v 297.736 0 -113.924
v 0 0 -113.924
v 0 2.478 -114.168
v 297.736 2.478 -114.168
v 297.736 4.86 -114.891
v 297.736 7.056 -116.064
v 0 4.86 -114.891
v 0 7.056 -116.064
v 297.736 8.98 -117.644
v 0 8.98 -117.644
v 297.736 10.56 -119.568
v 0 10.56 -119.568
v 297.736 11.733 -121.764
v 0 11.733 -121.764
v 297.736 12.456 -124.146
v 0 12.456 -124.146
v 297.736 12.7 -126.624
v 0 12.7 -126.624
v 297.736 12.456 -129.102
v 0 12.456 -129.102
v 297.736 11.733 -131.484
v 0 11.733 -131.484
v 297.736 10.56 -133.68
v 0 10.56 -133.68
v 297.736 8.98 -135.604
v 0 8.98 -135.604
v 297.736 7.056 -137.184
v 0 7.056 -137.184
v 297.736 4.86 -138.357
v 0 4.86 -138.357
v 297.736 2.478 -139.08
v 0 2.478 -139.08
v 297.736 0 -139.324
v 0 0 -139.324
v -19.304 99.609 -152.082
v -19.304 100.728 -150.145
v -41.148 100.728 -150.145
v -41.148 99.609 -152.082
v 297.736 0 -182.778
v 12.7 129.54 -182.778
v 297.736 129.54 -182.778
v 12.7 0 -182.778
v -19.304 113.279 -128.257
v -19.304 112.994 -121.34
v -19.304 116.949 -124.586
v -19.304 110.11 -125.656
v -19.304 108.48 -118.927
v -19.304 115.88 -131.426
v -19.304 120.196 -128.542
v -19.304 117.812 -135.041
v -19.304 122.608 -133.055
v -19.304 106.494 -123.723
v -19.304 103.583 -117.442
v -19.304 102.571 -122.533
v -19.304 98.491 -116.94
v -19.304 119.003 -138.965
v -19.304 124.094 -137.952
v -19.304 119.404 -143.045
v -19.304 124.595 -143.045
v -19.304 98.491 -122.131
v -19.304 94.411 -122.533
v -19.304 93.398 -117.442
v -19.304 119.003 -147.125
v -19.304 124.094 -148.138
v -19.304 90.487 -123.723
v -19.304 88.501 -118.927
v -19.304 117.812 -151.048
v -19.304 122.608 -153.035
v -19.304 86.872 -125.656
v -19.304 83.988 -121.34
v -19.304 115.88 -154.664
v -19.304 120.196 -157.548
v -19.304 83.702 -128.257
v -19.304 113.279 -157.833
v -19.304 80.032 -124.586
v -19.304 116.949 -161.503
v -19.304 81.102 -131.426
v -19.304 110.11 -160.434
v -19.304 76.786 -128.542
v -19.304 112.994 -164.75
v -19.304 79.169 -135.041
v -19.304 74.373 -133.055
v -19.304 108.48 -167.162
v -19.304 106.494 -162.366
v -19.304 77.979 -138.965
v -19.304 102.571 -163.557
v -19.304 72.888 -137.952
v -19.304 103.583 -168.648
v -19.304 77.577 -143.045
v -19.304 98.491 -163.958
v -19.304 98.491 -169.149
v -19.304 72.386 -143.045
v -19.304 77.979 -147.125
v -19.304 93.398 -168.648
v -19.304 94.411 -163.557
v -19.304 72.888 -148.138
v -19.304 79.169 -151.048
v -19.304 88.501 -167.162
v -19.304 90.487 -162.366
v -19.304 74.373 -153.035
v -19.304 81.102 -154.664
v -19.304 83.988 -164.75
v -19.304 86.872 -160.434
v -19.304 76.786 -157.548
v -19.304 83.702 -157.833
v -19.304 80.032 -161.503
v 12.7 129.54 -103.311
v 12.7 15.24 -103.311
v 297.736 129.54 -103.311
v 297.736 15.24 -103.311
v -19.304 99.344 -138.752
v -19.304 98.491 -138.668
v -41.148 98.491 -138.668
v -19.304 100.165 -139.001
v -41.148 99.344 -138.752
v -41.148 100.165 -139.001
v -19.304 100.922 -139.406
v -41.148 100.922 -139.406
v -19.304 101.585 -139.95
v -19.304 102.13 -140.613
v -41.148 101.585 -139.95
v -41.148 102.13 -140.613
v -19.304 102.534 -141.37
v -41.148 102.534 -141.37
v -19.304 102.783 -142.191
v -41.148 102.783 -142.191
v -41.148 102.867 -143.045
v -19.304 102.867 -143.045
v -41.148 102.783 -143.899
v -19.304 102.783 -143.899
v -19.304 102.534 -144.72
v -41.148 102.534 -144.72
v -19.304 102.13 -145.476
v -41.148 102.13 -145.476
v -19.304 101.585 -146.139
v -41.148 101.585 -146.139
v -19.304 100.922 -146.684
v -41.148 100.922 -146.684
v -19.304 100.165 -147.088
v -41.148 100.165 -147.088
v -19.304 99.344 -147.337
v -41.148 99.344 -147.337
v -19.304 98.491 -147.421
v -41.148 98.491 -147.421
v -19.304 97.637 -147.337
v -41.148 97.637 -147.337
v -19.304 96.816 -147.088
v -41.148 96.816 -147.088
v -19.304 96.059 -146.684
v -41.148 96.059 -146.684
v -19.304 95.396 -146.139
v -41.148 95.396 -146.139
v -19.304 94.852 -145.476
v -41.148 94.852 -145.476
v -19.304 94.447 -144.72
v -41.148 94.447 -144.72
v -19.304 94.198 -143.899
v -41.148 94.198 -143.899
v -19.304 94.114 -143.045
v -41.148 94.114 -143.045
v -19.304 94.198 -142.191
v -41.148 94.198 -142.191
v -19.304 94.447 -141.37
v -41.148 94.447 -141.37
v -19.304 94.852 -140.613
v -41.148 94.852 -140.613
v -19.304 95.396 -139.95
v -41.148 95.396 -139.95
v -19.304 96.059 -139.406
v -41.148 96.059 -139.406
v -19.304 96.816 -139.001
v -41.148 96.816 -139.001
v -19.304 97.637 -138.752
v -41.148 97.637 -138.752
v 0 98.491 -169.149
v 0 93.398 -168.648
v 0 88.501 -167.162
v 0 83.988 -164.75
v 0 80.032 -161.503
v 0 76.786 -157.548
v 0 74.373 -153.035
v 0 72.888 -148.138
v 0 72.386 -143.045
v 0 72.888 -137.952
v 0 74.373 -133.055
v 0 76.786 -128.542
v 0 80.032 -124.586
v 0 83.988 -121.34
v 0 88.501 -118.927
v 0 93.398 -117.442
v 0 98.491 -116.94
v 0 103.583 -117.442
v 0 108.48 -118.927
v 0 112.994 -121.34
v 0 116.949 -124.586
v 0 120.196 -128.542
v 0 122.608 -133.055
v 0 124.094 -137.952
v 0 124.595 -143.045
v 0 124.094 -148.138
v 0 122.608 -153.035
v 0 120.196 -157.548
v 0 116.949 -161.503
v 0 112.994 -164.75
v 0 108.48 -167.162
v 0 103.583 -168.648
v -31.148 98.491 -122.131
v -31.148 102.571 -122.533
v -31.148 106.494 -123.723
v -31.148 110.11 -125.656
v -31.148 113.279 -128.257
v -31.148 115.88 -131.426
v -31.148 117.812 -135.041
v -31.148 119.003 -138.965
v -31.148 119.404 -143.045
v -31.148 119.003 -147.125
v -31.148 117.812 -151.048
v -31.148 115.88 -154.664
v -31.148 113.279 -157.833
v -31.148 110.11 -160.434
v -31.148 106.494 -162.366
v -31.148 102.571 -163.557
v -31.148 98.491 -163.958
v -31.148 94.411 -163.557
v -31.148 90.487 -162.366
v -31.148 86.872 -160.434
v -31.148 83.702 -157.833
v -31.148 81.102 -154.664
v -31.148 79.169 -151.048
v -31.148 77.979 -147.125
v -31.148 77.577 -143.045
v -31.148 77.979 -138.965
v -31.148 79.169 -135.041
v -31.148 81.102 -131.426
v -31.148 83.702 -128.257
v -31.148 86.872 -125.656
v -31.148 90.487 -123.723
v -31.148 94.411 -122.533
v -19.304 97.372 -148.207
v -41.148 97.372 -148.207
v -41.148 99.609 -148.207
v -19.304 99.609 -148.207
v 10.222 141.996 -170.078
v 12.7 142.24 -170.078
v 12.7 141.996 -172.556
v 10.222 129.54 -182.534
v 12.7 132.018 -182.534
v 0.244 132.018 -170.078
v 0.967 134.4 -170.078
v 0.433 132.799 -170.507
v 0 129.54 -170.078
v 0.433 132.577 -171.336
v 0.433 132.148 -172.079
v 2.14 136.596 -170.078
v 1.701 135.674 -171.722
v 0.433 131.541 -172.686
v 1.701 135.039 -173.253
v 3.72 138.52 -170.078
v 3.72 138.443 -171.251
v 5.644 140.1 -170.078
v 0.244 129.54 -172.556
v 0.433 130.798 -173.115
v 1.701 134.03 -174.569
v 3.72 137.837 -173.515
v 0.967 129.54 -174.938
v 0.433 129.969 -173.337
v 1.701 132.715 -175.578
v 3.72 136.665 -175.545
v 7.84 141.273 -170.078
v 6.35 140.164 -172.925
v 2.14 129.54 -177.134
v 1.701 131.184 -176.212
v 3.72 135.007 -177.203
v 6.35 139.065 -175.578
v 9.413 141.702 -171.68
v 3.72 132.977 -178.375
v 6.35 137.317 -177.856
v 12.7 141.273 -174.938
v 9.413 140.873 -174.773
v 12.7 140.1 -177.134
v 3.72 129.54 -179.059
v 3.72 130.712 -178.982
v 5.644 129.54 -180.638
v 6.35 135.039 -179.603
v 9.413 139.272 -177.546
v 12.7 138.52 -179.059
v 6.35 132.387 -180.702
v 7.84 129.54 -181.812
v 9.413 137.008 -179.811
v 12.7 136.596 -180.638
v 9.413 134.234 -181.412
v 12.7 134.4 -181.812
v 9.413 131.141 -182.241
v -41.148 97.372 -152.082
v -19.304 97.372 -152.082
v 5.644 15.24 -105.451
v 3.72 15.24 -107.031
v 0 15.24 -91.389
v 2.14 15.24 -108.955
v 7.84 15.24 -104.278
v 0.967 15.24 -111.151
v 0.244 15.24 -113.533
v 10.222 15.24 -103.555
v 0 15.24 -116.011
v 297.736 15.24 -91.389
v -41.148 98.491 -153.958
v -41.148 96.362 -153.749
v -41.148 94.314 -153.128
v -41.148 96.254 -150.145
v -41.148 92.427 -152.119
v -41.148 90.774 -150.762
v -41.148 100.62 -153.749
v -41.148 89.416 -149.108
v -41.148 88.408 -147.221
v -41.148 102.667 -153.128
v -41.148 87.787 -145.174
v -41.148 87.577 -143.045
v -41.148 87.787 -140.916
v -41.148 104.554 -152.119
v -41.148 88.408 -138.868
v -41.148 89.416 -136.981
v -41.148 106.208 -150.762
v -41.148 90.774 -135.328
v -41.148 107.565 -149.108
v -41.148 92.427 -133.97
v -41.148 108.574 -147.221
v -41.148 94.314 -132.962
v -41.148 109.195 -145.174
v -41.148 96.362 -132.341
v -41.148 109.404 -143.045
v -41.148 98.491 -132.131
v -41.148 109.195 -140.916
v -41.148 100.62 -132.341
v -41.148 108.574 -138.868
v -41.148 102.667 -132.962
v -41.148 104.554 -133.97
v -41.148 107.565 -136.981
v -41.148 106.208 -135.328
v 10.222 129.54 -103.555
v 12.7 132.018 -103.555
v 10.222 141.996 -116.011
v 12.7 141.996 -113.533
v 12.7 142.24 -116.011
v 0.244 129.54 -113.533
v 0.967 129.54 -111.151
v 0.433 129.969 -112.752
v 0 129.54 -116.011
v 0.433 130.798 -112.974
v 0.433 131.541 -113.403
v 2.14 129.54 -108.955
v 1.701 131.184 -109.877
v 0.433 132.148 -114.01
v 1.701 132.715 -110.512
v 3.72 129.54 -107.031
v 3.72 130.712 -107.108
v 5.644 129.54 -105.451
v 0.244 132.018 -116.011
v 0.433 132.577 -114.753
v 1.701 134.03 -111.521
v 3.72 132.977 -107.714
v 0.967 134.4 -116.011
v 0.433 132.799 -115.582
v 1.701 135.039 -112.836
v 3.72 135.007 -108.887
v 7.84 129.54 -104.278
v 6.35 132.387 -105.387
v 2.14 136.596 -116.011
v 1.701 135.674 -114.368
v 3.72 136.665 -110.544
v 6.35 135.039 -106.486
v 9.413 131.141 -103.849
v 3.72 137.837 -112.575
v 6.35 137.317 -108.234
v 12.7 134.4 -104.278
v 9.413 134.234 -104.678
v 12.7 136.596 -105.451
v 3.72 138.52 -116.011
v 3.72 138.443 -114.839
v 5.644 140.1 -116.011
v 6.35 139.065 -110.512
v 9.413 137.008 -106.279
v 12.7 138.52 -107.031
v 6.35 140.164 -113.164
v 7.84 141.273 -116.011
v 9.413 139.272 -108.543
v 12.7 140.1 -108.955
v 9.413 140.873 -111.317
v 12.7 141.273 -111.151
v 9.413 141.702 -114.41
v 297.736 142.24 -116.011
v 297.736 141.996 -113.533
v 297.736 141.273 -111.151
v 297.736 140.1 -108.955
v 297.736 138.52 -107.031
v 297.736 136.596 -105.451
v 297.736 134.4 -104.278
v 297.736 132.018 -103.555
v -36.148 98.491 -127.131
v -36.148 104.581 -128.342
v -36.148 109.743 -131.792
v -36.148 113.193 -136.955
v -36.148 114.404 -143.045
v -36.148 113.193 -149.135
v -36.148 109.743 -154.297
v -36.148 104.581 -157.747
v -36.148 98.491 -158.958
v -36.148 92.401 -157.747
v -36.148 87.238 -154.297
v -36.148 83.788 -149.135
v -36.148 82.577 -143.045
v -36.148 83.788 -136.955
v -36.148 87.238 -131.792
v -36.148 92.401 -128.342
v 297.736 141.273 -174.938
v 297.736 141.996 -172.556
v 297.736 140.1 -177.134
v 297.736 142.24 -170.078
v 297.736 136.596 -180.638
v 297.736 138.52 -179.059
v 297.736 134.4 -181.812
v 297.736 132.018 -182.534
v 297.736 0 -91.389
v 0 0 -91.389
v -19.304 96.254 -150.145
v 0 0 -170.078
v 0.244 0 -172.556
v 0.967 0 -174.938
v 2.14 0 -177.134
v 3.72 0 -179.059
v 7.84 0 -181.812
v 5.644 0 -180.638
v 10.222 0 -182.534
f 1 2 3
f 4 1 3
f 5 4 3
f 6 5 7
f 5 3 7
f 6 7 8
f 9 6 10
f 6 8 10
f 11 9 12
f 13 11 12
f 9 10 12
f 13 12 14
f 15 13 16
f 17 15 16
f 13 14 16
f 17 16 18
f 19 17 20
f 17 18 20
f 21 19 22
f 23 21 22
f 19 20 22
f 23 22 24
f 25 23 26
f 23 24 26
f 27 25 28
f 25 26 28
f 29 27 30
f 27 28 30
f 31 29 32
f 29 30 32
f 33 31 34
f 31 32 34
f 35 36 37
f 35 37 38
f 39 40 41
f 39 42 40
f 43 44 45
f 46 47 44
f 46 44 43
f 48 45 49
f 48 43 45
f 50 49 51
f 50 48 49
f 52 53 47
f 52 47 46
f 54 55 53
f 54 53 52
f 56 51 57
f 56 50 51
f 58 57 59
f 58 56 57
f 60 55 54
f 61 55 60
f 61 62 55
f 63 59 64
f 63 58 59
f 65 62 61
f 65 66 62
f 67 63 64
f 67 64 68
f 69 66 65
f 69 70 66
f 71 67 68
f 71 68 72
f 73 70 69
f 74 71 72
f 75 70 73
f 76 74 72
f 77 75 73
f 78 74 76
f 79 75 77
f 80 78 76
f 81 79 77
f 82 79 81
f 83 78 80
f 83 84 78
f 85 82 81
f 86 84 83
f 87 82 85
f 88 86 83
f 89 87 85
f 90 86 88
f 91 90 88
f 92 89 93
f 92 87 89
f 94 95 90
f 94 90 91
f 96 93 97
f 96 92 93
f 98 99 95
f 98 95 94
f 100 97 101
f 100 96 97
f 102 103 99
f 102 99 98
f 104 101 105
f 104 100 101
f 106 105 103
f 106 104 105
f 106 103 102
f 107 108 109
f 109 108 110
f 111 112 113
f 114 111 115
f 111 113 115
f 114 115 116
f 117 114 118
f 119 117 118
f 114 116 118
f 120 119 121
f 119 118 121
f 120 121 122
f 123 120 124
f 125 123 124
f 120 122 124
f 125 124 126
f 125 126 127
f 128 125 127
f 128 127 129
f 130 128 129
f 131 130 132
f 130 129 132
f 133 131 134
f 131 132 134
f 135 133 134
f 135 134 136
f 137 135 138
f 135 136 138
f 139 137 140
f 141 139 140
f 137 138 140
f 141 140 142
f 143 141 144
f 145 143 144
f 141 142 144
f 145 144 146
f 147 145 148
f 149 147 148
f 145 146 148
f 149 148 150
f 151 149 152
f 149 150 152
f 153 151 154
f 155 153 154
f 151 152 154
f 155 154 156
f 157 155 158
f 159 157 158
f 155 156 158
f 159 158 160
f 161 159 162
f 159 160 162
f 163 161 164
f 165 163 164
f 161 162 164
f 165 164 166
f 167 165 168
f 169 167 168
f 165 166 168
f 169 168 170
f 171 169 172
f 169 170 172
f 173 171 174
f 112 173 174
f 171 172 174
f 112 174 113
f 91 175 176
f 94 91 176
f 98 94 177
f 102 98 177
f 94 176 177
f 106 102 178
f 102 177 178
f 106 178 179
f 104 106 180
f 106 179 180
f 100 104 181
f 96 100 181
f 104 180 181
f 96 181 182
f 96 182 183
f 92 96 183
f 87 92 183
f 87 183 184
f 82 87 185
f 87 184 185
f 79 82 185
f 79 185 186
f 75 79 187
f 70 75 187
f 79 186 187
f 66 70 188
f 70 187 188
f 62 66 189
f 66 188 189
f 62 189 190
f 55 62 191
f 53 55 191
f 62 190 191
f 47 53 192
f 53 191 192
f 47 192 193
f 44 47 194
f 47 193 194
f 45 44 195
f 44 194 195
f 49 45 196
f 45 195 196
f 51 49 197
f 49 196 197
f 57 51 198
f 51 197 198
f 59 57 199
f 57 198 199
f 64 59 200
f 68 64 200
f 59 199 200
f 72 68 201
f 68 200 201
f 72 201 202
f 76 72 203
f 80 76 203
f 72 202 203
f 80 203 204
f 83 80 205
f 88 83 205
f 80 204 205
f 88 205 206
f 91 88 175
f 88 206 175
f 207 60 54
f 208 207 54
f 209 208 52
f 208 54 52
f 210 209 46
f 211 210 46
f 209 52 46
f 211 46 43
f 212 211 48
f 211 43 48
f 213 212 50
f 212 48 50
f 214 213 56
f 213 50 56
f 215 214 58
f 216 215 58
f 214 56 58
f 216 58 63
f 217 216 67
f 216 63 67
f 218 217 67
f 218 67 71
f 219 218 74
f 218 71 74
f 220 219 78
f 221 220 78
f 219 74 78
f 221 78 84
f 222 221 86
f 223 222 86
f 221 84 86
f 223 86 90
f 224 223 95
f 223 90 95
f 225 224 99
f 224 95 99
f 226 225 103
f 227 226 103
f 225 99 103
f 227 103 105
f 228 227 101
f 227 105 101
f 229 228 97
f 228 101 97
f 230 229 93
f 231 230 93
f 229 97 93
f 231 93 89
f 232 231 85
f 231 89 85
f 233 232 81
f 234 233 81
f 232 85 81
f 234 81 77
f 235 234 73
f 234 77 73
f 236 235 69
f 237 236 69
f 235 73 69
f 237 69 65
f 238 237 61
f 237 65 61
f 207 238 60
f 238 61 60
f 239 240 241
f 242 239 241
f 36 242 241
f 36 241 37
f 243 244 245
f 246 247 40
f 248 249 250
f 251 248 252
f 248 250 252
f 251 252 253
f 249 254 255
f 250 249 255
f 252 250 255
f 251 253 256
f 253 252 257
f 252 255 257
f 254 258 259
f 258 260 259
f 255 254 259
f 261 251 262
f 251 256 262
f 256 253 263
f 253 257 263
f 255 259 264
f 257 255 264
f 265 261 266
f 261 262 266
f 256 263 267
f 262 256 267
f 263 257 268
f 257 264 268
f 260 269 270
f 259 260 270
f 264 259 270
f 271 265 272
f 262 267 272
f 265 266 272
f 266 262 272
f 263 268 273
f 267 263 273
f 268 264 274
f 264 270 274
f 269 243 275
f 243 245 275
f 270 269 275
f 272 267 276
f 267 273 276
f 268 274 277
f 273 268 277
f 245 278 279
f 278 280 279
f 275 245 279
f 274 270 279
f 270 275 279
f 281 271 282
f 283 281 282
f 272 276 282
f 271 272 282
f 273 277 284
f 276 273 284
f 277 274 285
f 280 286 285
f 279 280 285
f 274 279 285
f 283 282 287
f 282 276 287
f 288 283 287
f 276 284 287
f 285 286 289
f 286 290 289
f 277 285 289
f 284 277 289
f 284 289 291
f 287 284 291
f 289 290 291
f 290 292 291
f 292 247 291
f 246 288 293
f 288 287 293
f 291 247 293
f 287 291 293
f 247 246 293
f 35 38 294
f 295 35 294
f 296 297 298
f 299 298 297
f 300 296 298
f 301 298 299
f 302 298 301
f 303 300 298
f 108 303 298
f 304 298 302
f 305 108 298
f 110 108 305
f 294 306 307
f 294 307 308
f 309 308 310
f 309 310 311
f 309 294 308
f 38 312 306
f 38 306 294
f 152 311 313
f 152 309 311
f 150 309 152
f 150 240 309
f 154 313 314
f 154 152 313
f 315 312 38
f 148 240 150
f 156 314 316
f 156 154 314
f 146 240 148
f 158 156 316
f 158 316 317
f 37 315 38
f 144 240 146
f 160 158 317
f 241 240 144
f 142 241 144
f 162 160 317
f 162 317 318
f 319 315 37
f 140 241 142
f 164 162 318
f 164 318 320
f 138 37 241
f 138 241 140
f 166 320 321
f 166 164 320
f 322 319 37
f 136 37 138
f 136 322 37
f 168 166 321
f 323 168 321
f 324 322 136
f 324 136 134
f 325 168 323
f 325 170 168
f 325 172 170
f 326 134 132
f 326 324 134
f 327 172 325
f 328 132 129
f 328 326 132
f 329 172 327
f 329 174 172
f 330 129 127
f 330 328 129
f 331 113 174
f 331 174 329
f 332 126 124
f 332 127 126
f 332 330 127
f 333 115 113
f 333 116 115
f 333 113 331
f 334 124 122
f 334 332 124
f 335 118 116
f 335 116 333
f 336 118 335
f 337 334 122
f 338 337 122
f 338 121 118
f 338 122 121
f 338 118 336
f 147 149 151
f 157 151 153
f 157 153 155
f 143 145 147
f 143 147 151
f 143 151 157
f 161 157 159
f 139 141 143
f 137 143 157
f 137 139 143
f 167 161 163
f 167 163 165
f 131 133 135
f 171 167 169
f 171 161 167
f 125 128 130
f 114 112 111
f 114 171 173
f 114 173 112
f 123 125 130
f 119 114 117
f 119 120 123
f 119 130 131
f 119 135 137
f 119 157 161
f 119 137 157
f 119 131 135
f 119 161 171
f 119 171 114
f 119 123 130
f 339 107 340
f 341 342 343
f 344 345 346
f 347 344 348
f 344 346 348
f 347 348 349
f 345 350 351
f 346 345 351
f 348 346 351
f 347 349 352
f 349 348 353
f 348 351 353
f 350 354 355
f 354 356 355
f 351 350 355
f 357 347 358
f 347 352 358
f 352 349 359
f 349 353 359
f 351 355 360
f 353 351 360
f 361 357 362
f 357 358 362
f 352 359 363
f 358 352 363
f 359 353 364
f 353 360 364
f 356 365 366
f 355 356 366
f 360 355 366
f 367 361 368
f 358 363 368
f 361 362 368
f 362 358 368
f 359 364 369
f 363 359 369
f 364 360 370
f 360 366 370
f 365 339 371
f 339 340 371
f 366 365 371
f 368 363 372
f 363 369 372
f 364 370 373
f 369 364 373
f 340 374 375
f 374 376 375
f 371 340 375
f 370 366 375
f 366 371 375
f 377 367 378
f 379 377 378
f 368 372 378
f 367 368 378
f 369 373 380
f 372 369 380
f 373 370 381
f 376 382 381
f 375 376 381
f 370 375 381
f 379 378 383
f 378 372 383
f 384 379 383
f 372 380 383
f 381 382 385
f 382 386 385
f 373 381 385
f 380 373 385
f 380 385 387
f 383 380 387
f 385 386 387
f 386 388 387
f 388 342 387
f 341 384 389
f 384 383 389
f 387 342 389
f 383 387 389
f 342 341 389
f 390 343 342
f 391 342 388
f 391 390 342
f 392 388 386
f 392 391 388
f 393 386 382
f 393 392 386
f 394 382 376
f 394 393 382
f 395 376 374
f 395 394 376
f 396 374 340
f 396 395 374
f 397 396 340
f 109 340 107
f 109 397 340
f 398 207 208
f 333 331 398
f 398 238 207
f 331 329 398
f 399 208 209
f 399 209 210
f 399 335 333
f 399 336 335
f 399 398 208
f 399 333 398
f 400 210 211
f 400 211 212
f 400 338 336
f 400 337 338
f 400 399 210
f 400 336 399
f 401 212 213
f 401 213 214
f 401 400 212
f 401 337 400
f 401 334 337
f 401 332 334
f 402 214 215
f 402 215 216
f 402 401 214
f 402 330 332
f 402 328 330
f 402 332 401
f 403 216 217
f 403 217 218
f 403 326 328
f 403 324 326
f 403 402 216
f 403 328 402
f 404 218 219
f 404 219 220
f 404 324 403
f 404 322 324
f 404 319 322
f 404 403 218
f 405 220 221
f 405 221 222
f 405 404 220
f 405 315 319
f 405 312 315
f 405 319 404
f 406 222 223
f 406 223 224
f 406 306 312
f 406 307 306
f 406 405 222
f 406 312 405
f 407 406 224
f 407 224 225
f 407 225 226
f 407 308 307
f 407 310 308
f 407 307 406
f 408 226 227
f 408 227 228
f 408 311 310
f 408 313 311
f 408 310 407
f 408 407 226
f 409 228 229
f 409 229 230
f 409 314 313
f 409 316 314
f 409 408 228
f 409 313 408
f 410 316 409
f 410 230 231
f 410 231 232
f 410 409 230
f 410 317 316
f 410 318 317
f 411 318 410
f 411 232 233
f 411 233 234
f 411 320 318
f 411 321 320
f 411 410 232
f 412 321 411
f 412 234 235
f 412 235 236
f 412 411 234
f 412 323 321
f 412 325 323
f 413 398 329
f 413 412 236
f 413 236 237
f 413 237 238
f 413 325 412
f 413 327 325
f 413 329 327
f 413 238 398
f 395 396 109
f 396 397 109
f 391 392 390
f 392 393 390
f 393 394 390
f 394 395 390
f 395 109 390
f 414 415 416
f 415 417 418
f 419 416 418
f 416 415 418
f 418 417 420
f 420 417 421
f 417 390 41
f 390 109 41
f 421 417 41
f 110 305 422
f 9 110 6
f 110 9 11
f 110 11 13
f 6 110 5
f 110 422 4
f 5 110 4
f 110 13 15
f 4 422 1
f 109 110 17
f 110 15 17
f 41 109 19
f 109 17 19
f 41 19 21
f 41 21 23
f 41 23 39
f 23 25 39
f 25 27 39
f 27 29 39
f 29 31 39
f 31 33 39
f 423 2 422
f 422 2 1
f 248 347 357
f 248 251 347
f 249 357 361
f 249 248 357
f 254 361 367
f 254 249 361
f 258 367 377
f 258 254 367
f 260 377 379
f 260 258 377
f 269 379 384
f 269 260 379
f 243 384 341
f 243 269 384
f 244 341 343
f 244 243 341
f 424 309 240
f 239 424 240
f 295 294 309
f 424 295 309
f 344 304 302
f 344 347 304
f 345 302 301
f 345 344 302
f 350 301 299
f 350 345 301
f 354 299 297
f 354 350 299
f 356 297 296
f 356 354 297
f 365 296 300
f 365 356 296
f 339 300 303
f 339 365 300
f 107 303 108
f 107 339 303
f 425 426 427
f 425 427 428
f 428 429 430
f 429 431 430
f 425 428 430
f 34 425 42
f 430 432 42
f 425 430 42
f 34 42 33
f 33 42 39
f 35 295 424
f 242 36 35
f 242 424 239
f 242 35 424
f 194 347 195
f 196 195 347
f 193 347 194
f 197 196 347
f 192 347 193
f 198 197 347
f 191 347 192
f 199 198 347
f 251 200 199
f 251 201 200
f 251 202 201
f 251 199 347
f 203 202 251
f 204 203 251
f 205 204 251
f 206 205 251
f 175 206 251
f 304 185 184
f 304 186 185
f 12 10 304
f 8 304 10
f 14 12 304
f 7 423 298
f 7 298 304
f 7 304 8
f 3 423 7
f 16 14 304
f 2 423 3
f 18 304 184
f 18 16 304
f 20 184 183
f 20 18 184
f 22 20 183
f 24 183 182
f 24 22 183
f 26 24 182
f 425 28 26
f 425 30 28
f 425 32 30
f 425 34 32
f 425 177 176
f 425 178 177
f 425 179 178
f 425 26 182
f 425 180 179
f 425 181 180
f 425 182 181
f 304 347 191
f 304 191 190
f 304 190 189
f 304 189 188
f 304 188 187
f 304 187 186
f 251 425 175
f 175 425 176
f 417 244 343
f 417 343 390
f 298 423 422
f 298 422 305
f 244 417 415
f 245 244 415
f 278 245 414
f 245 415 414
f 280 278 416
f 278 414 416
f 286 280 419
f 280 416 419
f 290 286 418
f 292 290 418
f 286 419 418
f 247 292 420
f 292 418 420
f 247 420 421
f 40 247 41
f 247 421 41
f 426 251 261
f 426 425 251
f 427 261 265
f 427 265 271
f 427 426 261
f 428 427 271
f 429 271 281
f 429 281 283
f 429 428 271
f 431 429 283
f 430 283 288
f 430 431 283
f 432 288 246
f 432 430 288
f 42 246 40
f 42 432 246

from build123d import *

# Parameters (mm, degrees)
SKETCH1_W           = 297.73626
SKETCH1_H           = 182.7784
BOSS_EXTRUDE1_DEPTH = 15.24
CUT_EXTRUDE1_DEPTH  = 350.695698609
SKETCH4_W           = 91.3892
SKETCH4_H           = 15.24
CUT_EXTRUDE3_DEPTH  = 350.695698609
SKETCH5_W           = 297.73626
SKETCH5_H           = 79.467279424
BOSS_EXTRUDE2_DEPTH = 127
FILLET1_R           = 12.7
FILLET2_R           = 12.7
FILLET3_R           = 12.7
SKETCH6_R           = 26.104541014
BOSS_EXTRUDE3_DEPTH = 19.304
SKETCH7_R           = 20.913687516
BOSS_EXTRUDE4_DEPTH = 21.844
CHAMFER1_SIZE       = 10
SKETCH8_R           = 4.376446561
CUT_EXTRUDE4_DEPTH  = 21.844


with BuildPart() as part:
    # Sketch1 → Boss-Extrude1 (new body)
    with BuildSketch(Plane(origin=(0, 0, 0), x_dir=(1, 0, 0), z_dir=(0, 1, 0))):
        with Locations((148.86813, 91.3892)):
            Rectangle(SKETCH1_W, SKETCH1_H)
    extrude(amount=BOSS_EXTRUDE1_DEPTH)

    # Sketch2 → Cut-Extrude1 (cut, through all)
    with BuildSketch(Plane.ZY):
        with BuildLine():
            ThreePointArc((-43.45432, 0), (-56.15432, 12.7), (-68.85432, 0))
            Line((-68.85432, 0), (-43.45432, 0))
        make_face()
        with BuildLine():
            ThreePointArc((-113.92408, 0), (-126.62408, 12.7), (-139.32408, 0))
            Line((-139.32408, 0), (-126.62408, 0))
            Line((-126.62408, 0), (-113.92408, 0))
        make_face()
    extrude(amount=-CUT_EXTRUDE1_DEPTH, mode=Mode.SUBTRACT)

    # Sketch4 → Cut-Extrude3 (cut, through all)
    with BuildSketch(Plane.ZY):
        with Locations((-45.6946, 7.62)):
            Rectangle(SKETCH4_W, SKETCH4_H)
    extrude(amount=-CUT_EXTRUDE3_DEPTH, mode=Mode.SUBTRACT)

    # Sketch5 → Boss-Extrude2 (add)
    with BuildSketch(Plane(origin=(0, 15.24, 0), x_dir=(1, 0, 0), z_dir=(0, 1, 0))):
        with Locations((148.86813, 143.044760288)):
            Rectangle(SKETCH5_W, SKETCH5_H)
    extrude(amount=BOSS_EXTRUDE2_DEPTH)

    # Fillet1
    fillet1_edges = [part.edges().sort_by_distance(p)[0] for p in [
        (148.86813, 142.24, -103.311120576),
    ]]
    fillet(fillet1_edges, radius=FILLET1_R)

    # Fillet2
    fillet2_edges = [part.edges().sort_by_distance(p)[0] for p in [
        (148.86813, 142.24, -182.7784),
    ]]
    fillet(fillet2_edges, radius=FILLET2_R)

    # Fillet3
    fillet3_edges = [part.edges().sort_by_distance(p)[0] for p in [
        (0, 72.39, -103.311120576),
        (0, 138.520256121, -107.030864455),
        (0, 64.77, -182.7784),
        (0, 142.24, -143.044760288),
        (0, 138.520256121, -179.058656121),
    ]]
    fillet(fillet3_edges, radius=FILLET3_R)

    # Sketch6 → Boss-Extrude3 (add)
    with BuildSketch(Plane.ZY):
        with Locations(Location((-143.044760288, 98.490679768, 0), (0, 0, 180))):
            Circle(SKETCH6_R)
    extrude(amount=BOSS_EXTRUDE3_DEPTH)

    # Sketch7 → Boss-Extrude4 (add)
    with BuildSketch(Plane.ZY.offset(19.304)):
        with Locations((-143.044760288, 98.490679768)):
            Circle(SKETCH7_R)
    extrude(amount=BOSS_EXTRUDE4_DEPTH)

    # Chamfer1
    chamfer1_edges = [part.edges().sort_by_distance(p)[0] for p in [
        (-41.148, 98.490679768, -163.958447804),
    ]]
    chamfer(chamfer1_edges, length=CHAMFER1_SIZE)

    # Sketch8 → Cut-Extrude4 (cut)
    with BuildSketch(Plane.ZY.offset(41.148)):
        with Locations((-143.044760288, 98.490679768)):
            Circle(SKETCH8_R)
        Polygon((-150.144784592, 100.727732071), (-152.082128716, 99.609205919), (-152.082128716, 97.372153616), (-150.144784592, 96.253627465), (-148.207440468, 97.372153616), (-148.207440468, 99.609205919), align=None)
    extrude(amount=-CUT_EXTRUDE4_DEPTH, mode=Mode.SUBTRACT)


solid = part.part
